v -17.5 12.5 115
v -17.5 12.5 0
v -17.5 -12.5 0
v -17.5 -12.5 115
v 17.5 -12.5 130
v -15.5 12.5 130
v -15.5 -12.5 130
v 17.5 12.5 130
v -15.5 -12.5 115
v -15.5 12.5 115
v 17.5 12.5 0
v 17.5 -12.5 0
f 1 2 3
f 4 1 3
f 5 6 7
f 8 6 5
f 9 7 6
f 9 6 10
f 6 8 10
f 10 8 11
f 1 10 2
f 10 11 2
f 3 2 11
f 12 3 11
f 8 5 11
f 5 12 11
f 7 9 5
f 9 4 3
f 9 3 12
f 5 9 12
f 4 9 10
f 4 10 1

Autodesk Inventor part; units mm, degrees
ref_plane "YZ Plane" through (0, 0, 0) normal (1, 0, 0) x (0, 1, 0)
ref_plane "XZ Plane" through (0, 0, 0) normal (0, 1, 0) x (-1, 0, 0)
ref_plane "XY Plane" through (0, 0, 0) normal (0, 0, 1) x (1, 0, 0)
sketch "Sketch1" plane through (0, 0, 0) normal (0, 0, 1) x (1, 0, 0)
  line L0 (-17.5, -12.5) -> (17.5, -12.5)
  line L1 (17.5, -12.5) -> (17.5, 12.5)
  line L2 (17.5, 12.5) -> (-17.5, 12.5)
  line L3 (-17.5, 12.5) -> (-17.5, -12.5)
  line L4 (-17.5, -12.5) -> (17.5, 12.5) construction
  line L5 (17.5, -12.5) -> (-17.5, 12.5) construction
  point P0 (0, 0)
  dimension "d0" = 35
  dimension "d1" = 25
extrude "Extrusion1" add sketch "Sketch1" along normal blind 130
sketch "Sketch2" plane through (-17.5, -12.5, 0) normal (0, -1, 0) x (1, 0, 0)
  line L0 (2, 115) -> (0, 115)
  line L1 (0, 115) -> (0, 130)
  line L2 (0, 130) -> (2, 130)
  line L3 (2, 130) -> (2, 115)
  line L4 (0, 0) -> (0, 130) projected
  line L5 (0, 130) -> (35, 130) projected
  point P0 (17.5, 0)
  dimension "d4" = 2
  dimension "d5" = 15
extrude "Extrusion2" cut sketch "Sketch2" against normal through all
properties part number "Distanzblock" material "Aluminum 6061"
